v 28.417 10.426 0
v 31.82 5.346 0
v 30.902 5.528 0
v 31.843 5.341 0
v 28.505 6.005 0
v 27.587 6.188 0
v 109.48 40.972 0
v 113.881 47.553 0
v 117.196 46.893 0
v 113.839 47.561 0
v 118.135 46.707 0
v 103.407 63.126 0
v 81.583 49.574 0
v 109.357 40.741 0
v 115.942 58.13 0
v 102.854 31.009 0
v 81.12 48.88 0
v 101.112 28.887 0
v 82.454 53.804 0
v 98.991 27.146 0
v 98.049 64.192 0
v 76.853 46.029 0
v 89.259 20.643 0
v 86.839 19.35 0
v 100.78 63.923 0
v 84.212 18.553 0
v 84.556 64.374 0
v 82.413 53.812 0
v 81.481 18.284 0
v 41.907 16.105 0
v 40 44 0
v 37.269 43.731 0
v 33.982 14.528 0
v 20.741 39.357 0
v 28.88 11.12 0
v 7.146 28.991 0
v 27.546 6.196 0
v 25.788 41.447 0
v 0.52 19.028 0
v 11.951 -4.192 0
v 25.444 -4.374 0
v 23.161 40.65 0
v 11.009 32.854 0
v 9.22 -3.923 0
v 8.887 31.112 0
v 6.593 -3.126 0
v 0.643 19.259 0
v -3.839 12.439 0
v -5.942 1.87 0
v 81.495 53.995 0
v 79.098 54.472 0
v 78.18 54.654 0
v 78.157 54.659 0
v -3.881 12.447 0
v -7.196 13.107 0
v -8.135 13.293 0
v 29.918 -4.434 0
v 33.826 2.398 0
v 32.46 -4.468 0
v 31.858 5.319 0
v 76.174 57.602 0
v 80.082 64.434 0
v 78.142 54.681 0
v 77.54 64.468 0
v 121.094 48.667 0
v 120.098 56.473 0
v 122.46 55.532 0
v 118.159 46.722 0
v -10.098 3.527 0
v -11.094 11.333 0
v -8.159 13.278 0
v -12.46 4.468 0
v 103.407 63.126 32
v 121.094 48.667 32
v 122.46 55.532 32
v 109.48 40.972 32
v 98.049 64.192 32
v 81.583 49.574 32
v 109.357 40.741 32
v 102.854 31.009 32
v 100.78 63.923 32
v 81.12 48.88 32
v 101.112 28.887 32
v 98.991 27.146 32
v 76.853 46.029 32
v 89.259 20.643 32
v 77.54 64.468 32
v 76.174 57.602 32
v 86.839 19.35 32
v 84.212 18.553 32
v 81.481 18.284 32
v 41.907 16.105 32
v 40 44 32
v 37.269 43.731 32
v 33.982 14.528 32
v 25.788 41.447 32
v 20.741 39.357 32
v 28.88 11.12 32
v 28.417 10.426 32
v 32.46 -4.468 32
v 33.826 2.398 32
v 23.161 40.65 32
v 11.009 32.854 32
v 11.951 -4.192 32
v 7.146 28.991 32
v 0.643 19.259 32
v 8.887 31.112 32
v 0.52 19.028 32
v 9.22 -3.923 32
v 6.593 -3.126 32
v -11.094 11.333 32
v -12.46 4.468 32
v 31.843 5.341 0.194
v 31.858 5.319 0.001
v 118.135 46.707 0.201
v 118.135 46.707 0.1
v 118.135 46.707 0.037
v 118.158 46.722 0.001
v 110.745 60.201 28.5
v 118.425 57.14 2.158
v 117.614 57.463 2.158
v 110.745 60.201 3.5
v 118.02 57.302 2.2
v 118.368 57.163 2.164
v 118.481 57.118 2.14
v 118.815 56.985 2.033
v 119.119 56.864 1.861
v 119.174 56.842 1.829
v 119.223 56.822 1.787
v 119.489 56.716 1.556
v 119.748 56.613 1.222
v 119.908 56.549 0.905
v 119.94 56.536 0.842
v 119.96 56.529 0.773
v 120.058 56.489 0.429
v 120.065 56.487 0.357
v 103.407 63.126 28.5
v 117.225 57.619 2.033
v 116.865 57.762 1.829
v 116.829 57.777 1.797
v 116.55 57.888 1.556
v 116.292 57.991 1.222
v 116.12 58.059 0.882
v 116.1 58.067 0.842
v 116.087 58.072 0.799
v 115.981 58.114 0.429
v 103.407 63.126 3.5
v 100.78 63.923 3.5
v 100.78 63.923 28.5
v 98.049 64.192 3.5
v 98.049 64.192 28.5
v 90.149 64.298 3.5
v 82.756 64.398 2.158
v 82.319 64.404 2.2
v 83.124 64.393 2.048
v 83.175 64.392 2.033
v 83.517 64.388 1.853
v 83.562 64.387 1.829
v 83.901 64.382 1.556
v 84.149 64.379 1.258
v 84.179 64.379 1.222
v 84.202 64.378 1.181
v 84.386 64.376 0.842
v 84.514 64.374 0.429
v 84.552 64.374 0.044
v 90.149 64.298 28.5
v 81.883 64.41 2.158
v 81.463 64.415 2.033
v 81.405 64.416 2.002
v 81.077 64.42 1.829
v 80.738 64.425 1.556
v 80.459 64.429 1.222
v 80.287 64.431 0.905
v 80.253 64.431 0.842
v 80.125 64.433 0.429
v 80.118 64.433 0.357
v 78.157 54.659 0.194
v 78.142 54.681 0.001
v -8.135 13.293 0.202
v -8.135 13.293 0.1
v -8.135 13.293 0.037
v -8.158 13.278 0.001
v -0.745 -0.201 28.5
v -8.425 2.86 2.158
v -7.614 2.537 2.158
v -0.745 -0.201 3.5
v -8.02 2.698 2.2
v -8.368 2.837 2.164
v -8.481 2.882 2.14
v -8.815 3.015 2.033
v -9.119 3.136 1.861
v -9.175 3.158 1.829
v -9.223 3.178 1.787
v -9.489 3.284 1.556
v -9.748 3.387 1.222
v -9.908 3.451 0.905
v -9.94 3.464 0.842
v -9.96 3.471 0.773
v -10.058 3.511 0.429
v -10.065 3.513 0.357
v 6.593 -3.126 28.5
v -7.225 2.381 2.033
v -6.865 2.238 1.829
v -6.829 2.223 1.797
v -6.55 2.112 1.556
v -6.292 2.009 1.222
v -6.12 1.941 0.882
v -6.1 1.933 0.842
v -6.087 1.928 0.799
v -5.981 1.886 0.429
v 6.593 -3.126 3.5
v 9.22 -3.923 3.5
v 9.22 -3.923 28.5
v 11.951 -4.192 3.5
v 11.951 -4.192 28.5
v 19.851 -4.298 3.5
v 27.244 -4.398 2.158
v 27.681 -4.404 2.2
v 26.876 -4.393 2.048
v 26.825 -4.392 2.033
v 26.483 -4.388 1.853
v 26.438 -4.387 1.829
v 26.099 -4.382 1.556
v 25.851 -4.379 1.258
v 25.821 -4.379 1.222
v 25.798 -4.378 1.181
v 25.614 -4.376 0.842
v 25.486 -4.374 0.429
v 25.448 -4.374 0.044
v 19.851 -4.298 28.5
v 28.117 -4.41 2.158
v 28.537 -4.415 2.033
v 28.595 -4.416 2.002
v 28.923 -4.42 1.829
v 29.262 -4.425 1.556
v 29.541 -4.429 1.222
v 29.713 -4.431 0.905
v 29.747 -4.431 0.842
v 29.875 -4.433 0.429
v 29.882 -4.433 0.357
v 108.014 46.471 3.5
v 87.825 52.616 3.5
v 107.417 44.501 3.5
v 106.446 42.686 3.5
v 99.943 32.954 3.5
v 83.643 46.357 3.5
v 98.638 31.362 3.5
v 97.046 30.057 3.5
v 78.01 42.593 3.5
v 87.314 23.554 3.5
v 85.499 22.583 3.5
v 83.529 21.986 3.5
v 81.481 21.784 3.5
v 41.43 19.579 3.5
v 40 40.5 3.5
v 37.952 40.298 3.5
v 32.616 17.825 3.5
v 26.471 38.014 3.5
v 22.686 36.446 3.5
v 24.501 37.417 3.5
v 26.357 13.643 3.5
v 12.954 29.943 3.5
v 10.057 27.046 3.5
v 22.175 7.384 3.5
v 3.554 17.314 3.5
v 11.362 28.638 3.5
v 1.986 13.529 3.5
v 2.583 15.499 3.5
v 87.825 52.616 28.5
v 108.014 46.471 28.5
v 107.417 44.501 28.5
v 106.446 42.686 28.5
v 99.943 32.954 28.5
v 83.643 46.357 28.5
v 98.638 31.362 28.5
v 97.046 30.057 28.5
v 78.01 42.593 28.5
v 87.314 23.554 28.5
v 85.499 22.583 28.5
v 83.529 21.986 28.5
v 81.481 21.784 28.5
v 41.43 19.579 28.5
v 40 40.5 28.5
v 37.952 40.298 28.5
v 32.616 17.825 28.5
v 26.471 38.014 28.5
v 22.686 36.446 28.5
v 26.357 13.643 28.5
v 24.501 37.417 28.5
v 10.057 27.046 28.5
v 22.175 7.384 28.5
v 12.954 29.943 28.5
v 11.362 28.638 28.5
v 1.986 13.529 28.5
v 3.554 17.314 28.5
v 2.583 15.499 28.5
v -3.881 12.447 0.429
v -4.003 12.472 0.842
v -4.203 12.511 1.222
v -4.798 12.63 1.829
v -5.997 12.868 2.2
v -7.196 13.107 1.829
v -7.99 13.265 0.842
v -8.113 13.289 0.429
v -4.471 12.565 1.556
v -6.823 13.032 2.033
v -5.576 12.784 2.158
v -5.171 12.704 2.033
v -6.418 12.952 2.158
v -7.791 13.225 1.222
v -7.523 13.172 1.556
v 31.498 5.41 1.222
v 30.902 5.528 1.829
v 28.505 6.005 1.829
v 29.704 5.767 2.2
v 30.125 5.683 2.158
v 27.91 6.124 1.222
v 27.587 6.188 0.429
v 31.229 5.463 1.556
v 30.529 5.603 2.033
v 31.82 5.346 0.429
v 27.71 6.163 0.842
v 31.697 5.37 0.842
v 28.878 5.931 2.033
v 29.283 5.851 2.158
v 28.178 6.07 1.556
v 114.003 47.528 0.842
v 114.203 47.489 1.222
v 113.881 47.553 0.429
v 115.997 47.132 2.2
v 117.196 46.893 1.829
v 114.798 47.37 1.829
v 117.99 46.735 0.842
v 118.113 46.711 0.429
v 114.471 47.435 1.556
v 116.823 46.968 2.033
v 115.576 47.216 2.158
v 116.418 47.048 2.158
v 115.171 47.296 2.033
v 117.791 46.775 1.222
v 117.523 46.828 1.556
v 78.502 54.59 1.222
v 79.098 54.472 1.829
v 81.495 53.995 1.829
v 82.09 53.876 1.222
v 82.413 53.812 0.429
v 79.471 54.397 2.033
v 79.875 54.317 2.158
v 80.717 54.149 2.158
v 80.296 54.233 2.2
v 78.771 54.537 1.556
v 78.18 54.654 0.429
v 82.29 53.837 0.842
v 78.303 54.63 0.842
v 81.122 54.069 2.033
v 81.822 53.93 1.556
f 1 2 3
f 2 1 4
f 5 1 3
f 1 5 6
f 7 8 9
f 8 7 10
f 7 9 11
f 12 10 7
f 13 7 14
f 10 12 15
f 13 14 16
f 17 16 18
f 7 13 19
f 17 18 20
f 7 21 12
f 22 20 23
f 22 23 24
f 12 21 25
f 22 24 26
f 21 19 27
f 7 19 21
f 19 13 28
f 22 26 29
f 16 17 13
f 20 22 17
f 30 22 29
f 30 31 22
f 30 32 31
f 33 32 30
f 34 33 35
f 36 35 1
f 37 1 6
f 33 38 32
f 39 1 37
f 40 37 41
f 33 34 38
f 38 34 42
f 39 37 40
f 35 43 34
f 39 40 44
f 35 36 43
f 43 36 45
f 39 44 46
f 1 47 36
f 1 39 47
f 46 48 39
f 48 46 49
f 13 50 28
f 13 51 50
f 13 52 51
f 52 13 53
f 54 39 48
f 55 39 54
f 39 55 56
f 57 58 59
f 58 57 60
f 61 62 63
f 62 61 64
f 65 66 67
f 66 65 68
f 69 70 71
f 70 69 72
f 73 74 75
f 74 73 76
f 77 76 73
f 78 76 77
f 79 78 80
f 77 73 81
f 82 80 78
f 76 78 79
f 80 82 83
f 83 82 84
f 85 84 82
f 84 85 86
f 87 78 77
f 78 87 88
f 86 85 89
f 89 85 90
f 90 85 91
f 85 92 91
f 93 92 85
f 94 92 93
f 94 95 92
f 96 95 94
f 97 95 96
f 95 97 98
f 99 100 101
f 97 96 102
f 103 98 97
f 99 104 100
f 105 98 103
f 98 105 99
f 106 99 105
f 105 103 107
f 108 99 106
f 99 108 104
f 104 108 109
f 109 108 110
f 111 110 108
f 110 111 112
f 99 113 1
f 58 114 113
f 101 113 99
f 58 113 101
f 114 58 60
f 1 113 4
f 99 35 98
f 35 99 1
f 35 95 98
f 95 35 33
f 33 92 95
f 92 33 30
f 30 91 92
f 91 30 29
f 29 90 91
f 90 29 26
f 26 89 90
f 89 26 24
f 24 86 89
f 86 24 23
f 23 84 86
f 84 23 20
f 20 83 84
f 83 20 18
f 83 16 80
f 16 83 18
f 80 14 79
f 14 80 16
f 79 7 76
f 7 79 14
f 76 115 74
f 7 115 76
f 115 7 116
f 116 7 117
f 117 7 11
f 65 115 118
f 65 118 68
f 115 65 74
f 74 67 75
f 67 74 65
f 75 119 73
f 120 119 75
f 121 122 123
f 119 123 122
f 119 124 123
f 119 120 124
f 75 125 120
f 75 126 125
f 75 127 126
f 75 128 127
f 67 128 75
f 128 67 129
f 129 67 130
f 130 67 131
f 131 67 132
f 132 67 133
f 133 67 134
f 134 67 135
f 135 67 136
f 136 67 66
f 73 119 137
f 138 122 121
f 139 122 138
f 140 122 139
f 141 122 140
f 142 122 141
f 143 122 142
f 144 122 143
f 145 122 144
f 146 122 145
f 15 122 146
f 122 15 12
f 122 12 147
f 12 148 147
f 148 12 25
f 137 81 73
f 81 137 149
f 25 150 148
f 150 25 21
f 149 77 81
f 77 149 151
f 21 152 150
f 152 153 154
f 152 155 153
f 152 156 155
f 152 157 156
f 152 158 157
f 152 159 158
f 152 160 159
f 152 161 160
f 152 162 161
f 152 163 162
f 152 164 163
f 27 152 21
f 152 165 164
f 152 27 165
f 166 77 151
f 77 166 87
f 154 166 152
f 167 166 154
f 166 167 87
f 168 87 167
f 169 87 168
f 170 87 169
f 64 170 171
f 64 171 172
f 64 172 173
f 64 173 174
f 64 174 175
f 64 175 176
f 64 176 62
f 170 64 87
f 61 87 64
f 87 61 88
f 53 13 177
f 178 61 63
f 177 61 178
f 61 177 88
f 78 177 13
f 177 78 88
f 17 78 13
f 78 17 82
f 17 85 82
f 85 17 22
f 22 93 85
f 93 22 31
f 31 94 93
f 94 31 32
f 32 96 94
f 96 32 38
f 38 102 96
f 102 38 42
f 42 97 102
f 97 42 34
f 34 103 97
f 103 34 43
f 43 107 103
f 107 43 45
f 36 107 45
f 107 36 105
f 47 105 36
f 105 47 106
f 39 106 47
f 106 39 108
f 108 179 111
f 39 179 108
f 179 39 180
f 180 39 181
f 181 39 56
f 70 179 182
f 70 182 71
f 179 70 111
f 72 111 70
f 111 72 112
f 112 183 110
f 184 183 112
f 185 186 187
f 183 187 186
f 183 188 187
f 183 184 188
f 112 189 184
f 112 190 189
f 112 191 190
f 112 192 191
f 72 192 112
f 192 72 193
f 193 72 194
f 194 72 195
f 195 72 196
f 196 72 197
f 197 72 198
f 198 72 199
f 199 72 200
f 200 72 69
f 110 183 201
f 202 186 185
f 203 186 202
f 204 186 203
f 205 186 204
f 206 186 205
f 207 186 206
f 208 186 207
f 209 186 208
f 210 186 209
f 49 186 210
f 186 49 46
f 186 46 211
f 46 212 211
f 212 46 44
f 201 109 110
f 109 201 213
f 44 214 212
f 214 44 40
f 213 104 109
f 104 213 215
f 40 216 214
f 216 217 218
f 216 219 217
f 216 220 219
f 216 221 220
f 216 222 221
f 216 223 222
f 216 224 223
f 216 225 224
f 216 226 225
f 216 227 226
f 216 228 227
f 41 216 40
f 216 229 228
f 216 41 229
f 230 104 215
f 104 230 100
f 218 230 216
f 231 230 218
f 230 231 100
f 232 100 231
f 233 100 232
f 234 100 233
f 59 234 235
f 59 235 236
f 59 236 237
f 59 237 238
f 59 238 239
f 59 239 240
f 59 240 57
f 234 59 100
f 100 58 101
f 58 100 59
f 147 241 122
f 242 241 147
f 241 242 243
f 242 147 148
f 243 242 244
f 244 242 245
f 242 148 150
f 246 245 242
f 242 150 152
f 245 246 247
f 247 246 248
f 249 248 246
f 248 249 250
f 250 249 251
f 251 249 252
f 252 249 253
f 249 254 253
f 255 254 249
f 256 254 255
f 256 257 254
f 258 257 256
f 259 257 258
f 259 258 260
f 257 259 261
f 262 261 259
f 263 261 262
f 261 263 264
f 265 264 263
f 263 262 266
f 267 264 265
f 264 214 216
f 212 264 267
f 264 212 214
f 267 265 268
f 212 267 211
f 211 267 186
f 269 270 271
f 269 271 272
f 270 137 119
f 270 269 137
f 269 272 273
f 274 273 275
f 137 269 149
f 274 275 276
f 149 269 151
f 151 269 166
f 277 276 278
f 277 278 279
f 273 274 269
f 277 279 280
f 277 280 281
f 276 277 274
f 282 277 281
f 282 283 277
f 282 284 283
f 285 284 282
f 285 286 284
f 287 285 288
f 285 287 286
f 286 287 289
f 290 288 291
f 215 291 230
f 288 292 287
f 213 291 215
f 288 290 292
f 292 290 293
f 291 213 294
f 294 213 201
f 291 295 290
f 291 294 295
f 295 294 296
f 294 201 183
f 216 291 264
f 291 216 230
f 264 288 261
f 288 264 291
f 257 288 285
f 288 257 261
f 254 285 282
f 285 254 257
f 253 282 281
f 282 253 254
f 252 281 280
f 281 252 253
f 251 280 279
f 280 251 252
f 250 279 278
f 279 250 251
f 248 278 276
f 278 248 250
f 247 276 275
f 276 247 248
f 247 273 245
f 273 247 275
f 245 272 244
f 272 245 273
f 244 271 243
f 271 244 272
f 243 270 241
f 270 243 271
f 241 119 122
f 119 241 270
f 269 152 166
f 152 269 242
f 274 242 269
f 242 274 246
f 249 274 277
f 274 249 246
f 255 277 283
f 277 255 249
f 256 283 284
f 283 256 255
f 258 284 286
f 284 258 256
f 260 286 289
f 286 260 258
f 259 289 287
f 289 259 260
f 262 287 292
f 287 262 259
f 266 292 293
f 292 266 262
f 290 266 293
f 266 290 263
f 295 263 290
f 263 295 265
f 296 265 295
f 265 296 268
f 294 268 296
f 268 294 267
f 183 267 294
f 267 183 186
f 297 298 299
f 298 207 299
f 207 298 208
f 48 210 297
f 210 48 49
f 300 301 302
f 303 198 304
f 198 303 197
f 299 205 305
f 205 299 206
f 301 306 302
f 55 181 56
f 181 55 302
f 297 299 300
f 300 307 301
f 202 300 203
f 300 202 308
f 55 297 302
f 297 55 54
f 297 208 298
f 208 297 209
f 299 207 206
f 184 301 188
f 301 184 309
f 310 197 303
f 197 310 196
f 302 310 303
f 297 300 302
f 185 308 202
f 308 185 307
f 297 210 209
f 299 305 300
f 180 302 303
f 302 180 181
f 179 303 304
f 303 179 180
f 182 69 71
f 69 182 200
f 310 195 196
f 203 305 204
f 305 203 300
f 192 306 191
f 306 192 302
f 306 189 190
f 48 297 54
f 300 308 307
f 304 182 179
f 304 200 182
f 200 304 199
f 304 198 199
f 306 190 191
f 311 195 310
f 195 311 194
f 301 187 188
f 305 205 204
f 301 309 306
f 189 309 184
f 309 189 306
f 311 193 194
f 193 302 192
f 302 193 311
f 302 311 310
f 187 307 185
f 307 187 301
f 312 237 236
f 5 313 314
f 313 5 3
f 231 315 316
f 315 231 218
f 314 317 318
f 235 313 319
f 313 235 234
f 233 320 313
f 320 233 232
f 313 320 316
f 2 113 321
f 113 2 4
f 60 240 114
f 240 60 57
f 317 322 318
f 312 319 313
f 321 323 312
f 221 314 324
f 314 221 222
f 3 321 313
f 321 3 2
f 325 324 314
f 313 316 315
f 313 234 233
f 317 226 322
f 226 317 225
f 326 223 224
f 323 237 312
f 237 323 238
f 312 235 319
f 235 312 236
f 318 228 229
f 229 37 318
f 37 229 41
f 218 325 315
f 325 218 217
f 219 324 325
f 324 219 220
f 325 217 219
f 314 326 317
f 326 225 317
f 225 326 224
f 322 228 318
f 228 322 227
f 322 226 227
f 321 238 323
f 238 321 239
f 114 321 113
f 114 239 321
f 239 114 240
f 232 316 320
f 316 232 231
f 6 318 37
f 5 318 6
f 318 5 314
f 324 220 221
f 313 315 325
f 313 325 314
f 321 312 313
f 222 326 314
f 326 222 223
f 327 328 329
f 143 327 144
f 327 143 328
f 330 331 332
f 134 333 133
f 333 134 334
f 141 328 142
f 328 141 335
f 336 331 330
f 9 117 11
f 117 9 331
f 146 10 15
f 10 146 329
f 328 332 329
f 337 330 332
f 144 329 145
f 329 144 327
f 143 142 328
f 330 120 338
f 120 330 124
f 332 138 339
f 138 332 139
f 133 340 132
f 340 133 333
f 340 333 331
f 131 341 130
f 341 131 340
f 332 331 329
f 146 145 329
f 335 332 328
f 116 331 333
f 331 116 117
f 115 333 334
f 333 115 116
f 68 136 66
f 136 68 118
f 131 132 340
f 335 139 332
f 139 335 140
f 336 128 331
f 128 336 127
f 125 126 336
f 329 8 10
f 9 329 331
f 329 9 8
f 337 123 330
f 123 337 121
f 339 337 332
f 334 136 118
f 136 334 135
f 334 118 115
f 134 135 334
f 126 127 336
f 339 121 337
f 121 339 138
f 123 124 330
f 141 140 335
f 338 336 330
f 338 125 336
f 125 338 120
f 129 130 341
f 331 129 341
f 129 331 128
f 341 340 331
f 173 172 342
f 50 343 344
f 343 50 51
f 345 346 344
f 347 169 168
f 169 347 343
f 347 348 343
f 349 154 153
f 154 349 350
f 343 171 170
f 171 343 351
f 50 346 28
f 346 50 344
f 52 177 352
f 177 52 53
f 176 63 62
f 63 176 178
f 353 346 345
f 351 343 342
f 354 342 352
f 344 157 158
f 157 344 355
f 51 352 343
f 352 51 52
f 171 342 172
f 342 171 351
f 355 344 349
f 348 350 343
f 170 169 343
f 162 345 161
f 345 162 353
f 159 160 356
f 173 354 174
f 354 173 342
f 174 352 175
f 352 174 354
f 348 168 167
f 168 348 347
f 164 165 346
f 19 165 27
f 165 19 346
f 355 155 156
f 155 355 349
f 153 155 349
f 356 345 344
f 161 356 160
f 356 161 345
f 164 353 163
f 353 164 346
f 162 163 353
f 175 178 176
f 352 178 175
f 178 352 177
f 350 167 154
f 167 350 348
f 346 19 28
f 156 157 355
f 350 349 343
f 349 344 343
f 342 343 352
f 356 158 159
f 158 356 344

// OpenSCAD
$fn = 32;

// ----------------------------------------------------------------------
// Air duct: 28 mm duct, 3.5 mm wall, 32 mm across
// ----------------------------------------------------------------------

// --- parameters (mm) ---
duct_r = 14;              // duct core radius
duct_d = 28;              // duct core diameter
wall = 3.5;               // duct wall thickness
height = 32;              // duct width (extrusion height)
port_r = 22.9;            // port flange half width
port_d = 45.8;            // port flange width
port_t = 7;               // port flange thickness
bolt_d = 4.4;             // port bolt holes
bolt_offset = 18.2;       // bolt hole offset from the port axis

difference() {
  /* outer hull chain: tube with a flat flange plate at every port */
  linear_extrude(height = 32) {
    hull() {
      polygon([[32.46, -4.468], [-12.46, 4.468], [-11.094, 11.333], [33.826, 2.398]]);
      translate([11.951, 9.808]) circle(r = 14);
    }
    hull() {
      translate([11.951, 9.808]) circle(r = 14);
      translate([12.284, 11.481]) circle(r = 14);
    }
    hull() {
      translate([12.284, 11.481]) circle(r = 14);
      translate([18.787, 21.213]) circle(r = 14);
    }
    hull() {
      translate([18.787, 21.213]) circle(r = 14);
      translate([28.519, 27.716]) circle(r = 14);
    }
    hull() {
      translate([28.519, 27.716]) circle(r = 14);
      translate([40, 30]) circle(r = 14);
    }
    hull() {
      translate([40, 30]) circle(r = 14);
      translate([81.481, 32.284]) circle(r = 14);
    }
    hull() {
      translate([81.481, 32.284]) circle(r = 14);
      translate([91.213, 38.787]) circle(r = 14);
    }
    hull() {
      translate([91.213, 38.787]) circle(r = 14);
      translate([97.716, 48.519]) circle(r = 14);
    }
    hull() {
      translate([97.716, 48.519]) circle(r = 14);
      translate([98.049, 50.192]) circle(r = 14);
    }
    hull() {
      translate([98.049, 50.192]) circle(r = 14);
      polygon([[77.54, 64.468], [122.46, 55.532], [121.094, 48.667], [76.174, 57.602]]);
    }
  }
  /* air passage: the same chain inset by the wall, 5 mm proud of the ports */
  translate([0, 0, 3.5]) linear_extrude(height = 25) {
    hull() {
      translate([9.025, -4.904]) circle(r = 10.5);
      translate([12.284, 11.481]) circle(r = 10.5);
    }
    hull() {
      translate([12.284, 11.481]) circle(r = 10.5);
      translate([18.787, 21.213]) circle(r = 10.5);
    }
    hull() {
      translate([18.787, 21.213]) circle(r = 10.5);
      translate([28.519, 27.716]) circle(r = 10.5);
    }
    hull() {
      translate([28.519, 27.716]) circle(r = 10.5);
      translate([40, 30]) circle(r = 10.5);
    }
    hull() {
      translate([40, 30]) circle(r = 10.5);
      translate([81.481, 32.284]) circle(r = 10.5);
    }
    hull() {
      translate([81.481, 32.284]) circle(r = 10.5);
      translate([91.213, 38.787]) circle(r = 10.5);
    }
    hull() {
      translate([91.213, 38.787]) circle(r = 10.5);
      translate([97.716, 48.519]) circle(r = 10.5);
    }
    hull() {
      translate([97.716, 48.519]) circle(r = 10.5);
      translate([100.975, 64.904]) circle(r = 10.5);
    }
  }
  translate([10, 0]) rotate([0, 0, -11.25]) translate([-18.2, -2.5]) rotate([-90, 0, 0]) cylinder(h = 12, d = 4.4);
  translate([10, 0]) rotate([0, 0, -11.25]) translate([18.2, -2.5]) rotate([-90, 0, 0]) cylinder(h = 12, d = 4.4);
  translate([100, 60]) rotate([0, 0, 168.75]) translate([-18.2, -2.5]) rotate([-90, 0, 0]) cylinder(h = 12, d = 4.4);
  translate([100, 60]) rotate([0, 0, 168.75]) translate([18.2, -2.5]) rotate([-90, 0, 0]) cylinder(h = 12, d = 4.4);
}
